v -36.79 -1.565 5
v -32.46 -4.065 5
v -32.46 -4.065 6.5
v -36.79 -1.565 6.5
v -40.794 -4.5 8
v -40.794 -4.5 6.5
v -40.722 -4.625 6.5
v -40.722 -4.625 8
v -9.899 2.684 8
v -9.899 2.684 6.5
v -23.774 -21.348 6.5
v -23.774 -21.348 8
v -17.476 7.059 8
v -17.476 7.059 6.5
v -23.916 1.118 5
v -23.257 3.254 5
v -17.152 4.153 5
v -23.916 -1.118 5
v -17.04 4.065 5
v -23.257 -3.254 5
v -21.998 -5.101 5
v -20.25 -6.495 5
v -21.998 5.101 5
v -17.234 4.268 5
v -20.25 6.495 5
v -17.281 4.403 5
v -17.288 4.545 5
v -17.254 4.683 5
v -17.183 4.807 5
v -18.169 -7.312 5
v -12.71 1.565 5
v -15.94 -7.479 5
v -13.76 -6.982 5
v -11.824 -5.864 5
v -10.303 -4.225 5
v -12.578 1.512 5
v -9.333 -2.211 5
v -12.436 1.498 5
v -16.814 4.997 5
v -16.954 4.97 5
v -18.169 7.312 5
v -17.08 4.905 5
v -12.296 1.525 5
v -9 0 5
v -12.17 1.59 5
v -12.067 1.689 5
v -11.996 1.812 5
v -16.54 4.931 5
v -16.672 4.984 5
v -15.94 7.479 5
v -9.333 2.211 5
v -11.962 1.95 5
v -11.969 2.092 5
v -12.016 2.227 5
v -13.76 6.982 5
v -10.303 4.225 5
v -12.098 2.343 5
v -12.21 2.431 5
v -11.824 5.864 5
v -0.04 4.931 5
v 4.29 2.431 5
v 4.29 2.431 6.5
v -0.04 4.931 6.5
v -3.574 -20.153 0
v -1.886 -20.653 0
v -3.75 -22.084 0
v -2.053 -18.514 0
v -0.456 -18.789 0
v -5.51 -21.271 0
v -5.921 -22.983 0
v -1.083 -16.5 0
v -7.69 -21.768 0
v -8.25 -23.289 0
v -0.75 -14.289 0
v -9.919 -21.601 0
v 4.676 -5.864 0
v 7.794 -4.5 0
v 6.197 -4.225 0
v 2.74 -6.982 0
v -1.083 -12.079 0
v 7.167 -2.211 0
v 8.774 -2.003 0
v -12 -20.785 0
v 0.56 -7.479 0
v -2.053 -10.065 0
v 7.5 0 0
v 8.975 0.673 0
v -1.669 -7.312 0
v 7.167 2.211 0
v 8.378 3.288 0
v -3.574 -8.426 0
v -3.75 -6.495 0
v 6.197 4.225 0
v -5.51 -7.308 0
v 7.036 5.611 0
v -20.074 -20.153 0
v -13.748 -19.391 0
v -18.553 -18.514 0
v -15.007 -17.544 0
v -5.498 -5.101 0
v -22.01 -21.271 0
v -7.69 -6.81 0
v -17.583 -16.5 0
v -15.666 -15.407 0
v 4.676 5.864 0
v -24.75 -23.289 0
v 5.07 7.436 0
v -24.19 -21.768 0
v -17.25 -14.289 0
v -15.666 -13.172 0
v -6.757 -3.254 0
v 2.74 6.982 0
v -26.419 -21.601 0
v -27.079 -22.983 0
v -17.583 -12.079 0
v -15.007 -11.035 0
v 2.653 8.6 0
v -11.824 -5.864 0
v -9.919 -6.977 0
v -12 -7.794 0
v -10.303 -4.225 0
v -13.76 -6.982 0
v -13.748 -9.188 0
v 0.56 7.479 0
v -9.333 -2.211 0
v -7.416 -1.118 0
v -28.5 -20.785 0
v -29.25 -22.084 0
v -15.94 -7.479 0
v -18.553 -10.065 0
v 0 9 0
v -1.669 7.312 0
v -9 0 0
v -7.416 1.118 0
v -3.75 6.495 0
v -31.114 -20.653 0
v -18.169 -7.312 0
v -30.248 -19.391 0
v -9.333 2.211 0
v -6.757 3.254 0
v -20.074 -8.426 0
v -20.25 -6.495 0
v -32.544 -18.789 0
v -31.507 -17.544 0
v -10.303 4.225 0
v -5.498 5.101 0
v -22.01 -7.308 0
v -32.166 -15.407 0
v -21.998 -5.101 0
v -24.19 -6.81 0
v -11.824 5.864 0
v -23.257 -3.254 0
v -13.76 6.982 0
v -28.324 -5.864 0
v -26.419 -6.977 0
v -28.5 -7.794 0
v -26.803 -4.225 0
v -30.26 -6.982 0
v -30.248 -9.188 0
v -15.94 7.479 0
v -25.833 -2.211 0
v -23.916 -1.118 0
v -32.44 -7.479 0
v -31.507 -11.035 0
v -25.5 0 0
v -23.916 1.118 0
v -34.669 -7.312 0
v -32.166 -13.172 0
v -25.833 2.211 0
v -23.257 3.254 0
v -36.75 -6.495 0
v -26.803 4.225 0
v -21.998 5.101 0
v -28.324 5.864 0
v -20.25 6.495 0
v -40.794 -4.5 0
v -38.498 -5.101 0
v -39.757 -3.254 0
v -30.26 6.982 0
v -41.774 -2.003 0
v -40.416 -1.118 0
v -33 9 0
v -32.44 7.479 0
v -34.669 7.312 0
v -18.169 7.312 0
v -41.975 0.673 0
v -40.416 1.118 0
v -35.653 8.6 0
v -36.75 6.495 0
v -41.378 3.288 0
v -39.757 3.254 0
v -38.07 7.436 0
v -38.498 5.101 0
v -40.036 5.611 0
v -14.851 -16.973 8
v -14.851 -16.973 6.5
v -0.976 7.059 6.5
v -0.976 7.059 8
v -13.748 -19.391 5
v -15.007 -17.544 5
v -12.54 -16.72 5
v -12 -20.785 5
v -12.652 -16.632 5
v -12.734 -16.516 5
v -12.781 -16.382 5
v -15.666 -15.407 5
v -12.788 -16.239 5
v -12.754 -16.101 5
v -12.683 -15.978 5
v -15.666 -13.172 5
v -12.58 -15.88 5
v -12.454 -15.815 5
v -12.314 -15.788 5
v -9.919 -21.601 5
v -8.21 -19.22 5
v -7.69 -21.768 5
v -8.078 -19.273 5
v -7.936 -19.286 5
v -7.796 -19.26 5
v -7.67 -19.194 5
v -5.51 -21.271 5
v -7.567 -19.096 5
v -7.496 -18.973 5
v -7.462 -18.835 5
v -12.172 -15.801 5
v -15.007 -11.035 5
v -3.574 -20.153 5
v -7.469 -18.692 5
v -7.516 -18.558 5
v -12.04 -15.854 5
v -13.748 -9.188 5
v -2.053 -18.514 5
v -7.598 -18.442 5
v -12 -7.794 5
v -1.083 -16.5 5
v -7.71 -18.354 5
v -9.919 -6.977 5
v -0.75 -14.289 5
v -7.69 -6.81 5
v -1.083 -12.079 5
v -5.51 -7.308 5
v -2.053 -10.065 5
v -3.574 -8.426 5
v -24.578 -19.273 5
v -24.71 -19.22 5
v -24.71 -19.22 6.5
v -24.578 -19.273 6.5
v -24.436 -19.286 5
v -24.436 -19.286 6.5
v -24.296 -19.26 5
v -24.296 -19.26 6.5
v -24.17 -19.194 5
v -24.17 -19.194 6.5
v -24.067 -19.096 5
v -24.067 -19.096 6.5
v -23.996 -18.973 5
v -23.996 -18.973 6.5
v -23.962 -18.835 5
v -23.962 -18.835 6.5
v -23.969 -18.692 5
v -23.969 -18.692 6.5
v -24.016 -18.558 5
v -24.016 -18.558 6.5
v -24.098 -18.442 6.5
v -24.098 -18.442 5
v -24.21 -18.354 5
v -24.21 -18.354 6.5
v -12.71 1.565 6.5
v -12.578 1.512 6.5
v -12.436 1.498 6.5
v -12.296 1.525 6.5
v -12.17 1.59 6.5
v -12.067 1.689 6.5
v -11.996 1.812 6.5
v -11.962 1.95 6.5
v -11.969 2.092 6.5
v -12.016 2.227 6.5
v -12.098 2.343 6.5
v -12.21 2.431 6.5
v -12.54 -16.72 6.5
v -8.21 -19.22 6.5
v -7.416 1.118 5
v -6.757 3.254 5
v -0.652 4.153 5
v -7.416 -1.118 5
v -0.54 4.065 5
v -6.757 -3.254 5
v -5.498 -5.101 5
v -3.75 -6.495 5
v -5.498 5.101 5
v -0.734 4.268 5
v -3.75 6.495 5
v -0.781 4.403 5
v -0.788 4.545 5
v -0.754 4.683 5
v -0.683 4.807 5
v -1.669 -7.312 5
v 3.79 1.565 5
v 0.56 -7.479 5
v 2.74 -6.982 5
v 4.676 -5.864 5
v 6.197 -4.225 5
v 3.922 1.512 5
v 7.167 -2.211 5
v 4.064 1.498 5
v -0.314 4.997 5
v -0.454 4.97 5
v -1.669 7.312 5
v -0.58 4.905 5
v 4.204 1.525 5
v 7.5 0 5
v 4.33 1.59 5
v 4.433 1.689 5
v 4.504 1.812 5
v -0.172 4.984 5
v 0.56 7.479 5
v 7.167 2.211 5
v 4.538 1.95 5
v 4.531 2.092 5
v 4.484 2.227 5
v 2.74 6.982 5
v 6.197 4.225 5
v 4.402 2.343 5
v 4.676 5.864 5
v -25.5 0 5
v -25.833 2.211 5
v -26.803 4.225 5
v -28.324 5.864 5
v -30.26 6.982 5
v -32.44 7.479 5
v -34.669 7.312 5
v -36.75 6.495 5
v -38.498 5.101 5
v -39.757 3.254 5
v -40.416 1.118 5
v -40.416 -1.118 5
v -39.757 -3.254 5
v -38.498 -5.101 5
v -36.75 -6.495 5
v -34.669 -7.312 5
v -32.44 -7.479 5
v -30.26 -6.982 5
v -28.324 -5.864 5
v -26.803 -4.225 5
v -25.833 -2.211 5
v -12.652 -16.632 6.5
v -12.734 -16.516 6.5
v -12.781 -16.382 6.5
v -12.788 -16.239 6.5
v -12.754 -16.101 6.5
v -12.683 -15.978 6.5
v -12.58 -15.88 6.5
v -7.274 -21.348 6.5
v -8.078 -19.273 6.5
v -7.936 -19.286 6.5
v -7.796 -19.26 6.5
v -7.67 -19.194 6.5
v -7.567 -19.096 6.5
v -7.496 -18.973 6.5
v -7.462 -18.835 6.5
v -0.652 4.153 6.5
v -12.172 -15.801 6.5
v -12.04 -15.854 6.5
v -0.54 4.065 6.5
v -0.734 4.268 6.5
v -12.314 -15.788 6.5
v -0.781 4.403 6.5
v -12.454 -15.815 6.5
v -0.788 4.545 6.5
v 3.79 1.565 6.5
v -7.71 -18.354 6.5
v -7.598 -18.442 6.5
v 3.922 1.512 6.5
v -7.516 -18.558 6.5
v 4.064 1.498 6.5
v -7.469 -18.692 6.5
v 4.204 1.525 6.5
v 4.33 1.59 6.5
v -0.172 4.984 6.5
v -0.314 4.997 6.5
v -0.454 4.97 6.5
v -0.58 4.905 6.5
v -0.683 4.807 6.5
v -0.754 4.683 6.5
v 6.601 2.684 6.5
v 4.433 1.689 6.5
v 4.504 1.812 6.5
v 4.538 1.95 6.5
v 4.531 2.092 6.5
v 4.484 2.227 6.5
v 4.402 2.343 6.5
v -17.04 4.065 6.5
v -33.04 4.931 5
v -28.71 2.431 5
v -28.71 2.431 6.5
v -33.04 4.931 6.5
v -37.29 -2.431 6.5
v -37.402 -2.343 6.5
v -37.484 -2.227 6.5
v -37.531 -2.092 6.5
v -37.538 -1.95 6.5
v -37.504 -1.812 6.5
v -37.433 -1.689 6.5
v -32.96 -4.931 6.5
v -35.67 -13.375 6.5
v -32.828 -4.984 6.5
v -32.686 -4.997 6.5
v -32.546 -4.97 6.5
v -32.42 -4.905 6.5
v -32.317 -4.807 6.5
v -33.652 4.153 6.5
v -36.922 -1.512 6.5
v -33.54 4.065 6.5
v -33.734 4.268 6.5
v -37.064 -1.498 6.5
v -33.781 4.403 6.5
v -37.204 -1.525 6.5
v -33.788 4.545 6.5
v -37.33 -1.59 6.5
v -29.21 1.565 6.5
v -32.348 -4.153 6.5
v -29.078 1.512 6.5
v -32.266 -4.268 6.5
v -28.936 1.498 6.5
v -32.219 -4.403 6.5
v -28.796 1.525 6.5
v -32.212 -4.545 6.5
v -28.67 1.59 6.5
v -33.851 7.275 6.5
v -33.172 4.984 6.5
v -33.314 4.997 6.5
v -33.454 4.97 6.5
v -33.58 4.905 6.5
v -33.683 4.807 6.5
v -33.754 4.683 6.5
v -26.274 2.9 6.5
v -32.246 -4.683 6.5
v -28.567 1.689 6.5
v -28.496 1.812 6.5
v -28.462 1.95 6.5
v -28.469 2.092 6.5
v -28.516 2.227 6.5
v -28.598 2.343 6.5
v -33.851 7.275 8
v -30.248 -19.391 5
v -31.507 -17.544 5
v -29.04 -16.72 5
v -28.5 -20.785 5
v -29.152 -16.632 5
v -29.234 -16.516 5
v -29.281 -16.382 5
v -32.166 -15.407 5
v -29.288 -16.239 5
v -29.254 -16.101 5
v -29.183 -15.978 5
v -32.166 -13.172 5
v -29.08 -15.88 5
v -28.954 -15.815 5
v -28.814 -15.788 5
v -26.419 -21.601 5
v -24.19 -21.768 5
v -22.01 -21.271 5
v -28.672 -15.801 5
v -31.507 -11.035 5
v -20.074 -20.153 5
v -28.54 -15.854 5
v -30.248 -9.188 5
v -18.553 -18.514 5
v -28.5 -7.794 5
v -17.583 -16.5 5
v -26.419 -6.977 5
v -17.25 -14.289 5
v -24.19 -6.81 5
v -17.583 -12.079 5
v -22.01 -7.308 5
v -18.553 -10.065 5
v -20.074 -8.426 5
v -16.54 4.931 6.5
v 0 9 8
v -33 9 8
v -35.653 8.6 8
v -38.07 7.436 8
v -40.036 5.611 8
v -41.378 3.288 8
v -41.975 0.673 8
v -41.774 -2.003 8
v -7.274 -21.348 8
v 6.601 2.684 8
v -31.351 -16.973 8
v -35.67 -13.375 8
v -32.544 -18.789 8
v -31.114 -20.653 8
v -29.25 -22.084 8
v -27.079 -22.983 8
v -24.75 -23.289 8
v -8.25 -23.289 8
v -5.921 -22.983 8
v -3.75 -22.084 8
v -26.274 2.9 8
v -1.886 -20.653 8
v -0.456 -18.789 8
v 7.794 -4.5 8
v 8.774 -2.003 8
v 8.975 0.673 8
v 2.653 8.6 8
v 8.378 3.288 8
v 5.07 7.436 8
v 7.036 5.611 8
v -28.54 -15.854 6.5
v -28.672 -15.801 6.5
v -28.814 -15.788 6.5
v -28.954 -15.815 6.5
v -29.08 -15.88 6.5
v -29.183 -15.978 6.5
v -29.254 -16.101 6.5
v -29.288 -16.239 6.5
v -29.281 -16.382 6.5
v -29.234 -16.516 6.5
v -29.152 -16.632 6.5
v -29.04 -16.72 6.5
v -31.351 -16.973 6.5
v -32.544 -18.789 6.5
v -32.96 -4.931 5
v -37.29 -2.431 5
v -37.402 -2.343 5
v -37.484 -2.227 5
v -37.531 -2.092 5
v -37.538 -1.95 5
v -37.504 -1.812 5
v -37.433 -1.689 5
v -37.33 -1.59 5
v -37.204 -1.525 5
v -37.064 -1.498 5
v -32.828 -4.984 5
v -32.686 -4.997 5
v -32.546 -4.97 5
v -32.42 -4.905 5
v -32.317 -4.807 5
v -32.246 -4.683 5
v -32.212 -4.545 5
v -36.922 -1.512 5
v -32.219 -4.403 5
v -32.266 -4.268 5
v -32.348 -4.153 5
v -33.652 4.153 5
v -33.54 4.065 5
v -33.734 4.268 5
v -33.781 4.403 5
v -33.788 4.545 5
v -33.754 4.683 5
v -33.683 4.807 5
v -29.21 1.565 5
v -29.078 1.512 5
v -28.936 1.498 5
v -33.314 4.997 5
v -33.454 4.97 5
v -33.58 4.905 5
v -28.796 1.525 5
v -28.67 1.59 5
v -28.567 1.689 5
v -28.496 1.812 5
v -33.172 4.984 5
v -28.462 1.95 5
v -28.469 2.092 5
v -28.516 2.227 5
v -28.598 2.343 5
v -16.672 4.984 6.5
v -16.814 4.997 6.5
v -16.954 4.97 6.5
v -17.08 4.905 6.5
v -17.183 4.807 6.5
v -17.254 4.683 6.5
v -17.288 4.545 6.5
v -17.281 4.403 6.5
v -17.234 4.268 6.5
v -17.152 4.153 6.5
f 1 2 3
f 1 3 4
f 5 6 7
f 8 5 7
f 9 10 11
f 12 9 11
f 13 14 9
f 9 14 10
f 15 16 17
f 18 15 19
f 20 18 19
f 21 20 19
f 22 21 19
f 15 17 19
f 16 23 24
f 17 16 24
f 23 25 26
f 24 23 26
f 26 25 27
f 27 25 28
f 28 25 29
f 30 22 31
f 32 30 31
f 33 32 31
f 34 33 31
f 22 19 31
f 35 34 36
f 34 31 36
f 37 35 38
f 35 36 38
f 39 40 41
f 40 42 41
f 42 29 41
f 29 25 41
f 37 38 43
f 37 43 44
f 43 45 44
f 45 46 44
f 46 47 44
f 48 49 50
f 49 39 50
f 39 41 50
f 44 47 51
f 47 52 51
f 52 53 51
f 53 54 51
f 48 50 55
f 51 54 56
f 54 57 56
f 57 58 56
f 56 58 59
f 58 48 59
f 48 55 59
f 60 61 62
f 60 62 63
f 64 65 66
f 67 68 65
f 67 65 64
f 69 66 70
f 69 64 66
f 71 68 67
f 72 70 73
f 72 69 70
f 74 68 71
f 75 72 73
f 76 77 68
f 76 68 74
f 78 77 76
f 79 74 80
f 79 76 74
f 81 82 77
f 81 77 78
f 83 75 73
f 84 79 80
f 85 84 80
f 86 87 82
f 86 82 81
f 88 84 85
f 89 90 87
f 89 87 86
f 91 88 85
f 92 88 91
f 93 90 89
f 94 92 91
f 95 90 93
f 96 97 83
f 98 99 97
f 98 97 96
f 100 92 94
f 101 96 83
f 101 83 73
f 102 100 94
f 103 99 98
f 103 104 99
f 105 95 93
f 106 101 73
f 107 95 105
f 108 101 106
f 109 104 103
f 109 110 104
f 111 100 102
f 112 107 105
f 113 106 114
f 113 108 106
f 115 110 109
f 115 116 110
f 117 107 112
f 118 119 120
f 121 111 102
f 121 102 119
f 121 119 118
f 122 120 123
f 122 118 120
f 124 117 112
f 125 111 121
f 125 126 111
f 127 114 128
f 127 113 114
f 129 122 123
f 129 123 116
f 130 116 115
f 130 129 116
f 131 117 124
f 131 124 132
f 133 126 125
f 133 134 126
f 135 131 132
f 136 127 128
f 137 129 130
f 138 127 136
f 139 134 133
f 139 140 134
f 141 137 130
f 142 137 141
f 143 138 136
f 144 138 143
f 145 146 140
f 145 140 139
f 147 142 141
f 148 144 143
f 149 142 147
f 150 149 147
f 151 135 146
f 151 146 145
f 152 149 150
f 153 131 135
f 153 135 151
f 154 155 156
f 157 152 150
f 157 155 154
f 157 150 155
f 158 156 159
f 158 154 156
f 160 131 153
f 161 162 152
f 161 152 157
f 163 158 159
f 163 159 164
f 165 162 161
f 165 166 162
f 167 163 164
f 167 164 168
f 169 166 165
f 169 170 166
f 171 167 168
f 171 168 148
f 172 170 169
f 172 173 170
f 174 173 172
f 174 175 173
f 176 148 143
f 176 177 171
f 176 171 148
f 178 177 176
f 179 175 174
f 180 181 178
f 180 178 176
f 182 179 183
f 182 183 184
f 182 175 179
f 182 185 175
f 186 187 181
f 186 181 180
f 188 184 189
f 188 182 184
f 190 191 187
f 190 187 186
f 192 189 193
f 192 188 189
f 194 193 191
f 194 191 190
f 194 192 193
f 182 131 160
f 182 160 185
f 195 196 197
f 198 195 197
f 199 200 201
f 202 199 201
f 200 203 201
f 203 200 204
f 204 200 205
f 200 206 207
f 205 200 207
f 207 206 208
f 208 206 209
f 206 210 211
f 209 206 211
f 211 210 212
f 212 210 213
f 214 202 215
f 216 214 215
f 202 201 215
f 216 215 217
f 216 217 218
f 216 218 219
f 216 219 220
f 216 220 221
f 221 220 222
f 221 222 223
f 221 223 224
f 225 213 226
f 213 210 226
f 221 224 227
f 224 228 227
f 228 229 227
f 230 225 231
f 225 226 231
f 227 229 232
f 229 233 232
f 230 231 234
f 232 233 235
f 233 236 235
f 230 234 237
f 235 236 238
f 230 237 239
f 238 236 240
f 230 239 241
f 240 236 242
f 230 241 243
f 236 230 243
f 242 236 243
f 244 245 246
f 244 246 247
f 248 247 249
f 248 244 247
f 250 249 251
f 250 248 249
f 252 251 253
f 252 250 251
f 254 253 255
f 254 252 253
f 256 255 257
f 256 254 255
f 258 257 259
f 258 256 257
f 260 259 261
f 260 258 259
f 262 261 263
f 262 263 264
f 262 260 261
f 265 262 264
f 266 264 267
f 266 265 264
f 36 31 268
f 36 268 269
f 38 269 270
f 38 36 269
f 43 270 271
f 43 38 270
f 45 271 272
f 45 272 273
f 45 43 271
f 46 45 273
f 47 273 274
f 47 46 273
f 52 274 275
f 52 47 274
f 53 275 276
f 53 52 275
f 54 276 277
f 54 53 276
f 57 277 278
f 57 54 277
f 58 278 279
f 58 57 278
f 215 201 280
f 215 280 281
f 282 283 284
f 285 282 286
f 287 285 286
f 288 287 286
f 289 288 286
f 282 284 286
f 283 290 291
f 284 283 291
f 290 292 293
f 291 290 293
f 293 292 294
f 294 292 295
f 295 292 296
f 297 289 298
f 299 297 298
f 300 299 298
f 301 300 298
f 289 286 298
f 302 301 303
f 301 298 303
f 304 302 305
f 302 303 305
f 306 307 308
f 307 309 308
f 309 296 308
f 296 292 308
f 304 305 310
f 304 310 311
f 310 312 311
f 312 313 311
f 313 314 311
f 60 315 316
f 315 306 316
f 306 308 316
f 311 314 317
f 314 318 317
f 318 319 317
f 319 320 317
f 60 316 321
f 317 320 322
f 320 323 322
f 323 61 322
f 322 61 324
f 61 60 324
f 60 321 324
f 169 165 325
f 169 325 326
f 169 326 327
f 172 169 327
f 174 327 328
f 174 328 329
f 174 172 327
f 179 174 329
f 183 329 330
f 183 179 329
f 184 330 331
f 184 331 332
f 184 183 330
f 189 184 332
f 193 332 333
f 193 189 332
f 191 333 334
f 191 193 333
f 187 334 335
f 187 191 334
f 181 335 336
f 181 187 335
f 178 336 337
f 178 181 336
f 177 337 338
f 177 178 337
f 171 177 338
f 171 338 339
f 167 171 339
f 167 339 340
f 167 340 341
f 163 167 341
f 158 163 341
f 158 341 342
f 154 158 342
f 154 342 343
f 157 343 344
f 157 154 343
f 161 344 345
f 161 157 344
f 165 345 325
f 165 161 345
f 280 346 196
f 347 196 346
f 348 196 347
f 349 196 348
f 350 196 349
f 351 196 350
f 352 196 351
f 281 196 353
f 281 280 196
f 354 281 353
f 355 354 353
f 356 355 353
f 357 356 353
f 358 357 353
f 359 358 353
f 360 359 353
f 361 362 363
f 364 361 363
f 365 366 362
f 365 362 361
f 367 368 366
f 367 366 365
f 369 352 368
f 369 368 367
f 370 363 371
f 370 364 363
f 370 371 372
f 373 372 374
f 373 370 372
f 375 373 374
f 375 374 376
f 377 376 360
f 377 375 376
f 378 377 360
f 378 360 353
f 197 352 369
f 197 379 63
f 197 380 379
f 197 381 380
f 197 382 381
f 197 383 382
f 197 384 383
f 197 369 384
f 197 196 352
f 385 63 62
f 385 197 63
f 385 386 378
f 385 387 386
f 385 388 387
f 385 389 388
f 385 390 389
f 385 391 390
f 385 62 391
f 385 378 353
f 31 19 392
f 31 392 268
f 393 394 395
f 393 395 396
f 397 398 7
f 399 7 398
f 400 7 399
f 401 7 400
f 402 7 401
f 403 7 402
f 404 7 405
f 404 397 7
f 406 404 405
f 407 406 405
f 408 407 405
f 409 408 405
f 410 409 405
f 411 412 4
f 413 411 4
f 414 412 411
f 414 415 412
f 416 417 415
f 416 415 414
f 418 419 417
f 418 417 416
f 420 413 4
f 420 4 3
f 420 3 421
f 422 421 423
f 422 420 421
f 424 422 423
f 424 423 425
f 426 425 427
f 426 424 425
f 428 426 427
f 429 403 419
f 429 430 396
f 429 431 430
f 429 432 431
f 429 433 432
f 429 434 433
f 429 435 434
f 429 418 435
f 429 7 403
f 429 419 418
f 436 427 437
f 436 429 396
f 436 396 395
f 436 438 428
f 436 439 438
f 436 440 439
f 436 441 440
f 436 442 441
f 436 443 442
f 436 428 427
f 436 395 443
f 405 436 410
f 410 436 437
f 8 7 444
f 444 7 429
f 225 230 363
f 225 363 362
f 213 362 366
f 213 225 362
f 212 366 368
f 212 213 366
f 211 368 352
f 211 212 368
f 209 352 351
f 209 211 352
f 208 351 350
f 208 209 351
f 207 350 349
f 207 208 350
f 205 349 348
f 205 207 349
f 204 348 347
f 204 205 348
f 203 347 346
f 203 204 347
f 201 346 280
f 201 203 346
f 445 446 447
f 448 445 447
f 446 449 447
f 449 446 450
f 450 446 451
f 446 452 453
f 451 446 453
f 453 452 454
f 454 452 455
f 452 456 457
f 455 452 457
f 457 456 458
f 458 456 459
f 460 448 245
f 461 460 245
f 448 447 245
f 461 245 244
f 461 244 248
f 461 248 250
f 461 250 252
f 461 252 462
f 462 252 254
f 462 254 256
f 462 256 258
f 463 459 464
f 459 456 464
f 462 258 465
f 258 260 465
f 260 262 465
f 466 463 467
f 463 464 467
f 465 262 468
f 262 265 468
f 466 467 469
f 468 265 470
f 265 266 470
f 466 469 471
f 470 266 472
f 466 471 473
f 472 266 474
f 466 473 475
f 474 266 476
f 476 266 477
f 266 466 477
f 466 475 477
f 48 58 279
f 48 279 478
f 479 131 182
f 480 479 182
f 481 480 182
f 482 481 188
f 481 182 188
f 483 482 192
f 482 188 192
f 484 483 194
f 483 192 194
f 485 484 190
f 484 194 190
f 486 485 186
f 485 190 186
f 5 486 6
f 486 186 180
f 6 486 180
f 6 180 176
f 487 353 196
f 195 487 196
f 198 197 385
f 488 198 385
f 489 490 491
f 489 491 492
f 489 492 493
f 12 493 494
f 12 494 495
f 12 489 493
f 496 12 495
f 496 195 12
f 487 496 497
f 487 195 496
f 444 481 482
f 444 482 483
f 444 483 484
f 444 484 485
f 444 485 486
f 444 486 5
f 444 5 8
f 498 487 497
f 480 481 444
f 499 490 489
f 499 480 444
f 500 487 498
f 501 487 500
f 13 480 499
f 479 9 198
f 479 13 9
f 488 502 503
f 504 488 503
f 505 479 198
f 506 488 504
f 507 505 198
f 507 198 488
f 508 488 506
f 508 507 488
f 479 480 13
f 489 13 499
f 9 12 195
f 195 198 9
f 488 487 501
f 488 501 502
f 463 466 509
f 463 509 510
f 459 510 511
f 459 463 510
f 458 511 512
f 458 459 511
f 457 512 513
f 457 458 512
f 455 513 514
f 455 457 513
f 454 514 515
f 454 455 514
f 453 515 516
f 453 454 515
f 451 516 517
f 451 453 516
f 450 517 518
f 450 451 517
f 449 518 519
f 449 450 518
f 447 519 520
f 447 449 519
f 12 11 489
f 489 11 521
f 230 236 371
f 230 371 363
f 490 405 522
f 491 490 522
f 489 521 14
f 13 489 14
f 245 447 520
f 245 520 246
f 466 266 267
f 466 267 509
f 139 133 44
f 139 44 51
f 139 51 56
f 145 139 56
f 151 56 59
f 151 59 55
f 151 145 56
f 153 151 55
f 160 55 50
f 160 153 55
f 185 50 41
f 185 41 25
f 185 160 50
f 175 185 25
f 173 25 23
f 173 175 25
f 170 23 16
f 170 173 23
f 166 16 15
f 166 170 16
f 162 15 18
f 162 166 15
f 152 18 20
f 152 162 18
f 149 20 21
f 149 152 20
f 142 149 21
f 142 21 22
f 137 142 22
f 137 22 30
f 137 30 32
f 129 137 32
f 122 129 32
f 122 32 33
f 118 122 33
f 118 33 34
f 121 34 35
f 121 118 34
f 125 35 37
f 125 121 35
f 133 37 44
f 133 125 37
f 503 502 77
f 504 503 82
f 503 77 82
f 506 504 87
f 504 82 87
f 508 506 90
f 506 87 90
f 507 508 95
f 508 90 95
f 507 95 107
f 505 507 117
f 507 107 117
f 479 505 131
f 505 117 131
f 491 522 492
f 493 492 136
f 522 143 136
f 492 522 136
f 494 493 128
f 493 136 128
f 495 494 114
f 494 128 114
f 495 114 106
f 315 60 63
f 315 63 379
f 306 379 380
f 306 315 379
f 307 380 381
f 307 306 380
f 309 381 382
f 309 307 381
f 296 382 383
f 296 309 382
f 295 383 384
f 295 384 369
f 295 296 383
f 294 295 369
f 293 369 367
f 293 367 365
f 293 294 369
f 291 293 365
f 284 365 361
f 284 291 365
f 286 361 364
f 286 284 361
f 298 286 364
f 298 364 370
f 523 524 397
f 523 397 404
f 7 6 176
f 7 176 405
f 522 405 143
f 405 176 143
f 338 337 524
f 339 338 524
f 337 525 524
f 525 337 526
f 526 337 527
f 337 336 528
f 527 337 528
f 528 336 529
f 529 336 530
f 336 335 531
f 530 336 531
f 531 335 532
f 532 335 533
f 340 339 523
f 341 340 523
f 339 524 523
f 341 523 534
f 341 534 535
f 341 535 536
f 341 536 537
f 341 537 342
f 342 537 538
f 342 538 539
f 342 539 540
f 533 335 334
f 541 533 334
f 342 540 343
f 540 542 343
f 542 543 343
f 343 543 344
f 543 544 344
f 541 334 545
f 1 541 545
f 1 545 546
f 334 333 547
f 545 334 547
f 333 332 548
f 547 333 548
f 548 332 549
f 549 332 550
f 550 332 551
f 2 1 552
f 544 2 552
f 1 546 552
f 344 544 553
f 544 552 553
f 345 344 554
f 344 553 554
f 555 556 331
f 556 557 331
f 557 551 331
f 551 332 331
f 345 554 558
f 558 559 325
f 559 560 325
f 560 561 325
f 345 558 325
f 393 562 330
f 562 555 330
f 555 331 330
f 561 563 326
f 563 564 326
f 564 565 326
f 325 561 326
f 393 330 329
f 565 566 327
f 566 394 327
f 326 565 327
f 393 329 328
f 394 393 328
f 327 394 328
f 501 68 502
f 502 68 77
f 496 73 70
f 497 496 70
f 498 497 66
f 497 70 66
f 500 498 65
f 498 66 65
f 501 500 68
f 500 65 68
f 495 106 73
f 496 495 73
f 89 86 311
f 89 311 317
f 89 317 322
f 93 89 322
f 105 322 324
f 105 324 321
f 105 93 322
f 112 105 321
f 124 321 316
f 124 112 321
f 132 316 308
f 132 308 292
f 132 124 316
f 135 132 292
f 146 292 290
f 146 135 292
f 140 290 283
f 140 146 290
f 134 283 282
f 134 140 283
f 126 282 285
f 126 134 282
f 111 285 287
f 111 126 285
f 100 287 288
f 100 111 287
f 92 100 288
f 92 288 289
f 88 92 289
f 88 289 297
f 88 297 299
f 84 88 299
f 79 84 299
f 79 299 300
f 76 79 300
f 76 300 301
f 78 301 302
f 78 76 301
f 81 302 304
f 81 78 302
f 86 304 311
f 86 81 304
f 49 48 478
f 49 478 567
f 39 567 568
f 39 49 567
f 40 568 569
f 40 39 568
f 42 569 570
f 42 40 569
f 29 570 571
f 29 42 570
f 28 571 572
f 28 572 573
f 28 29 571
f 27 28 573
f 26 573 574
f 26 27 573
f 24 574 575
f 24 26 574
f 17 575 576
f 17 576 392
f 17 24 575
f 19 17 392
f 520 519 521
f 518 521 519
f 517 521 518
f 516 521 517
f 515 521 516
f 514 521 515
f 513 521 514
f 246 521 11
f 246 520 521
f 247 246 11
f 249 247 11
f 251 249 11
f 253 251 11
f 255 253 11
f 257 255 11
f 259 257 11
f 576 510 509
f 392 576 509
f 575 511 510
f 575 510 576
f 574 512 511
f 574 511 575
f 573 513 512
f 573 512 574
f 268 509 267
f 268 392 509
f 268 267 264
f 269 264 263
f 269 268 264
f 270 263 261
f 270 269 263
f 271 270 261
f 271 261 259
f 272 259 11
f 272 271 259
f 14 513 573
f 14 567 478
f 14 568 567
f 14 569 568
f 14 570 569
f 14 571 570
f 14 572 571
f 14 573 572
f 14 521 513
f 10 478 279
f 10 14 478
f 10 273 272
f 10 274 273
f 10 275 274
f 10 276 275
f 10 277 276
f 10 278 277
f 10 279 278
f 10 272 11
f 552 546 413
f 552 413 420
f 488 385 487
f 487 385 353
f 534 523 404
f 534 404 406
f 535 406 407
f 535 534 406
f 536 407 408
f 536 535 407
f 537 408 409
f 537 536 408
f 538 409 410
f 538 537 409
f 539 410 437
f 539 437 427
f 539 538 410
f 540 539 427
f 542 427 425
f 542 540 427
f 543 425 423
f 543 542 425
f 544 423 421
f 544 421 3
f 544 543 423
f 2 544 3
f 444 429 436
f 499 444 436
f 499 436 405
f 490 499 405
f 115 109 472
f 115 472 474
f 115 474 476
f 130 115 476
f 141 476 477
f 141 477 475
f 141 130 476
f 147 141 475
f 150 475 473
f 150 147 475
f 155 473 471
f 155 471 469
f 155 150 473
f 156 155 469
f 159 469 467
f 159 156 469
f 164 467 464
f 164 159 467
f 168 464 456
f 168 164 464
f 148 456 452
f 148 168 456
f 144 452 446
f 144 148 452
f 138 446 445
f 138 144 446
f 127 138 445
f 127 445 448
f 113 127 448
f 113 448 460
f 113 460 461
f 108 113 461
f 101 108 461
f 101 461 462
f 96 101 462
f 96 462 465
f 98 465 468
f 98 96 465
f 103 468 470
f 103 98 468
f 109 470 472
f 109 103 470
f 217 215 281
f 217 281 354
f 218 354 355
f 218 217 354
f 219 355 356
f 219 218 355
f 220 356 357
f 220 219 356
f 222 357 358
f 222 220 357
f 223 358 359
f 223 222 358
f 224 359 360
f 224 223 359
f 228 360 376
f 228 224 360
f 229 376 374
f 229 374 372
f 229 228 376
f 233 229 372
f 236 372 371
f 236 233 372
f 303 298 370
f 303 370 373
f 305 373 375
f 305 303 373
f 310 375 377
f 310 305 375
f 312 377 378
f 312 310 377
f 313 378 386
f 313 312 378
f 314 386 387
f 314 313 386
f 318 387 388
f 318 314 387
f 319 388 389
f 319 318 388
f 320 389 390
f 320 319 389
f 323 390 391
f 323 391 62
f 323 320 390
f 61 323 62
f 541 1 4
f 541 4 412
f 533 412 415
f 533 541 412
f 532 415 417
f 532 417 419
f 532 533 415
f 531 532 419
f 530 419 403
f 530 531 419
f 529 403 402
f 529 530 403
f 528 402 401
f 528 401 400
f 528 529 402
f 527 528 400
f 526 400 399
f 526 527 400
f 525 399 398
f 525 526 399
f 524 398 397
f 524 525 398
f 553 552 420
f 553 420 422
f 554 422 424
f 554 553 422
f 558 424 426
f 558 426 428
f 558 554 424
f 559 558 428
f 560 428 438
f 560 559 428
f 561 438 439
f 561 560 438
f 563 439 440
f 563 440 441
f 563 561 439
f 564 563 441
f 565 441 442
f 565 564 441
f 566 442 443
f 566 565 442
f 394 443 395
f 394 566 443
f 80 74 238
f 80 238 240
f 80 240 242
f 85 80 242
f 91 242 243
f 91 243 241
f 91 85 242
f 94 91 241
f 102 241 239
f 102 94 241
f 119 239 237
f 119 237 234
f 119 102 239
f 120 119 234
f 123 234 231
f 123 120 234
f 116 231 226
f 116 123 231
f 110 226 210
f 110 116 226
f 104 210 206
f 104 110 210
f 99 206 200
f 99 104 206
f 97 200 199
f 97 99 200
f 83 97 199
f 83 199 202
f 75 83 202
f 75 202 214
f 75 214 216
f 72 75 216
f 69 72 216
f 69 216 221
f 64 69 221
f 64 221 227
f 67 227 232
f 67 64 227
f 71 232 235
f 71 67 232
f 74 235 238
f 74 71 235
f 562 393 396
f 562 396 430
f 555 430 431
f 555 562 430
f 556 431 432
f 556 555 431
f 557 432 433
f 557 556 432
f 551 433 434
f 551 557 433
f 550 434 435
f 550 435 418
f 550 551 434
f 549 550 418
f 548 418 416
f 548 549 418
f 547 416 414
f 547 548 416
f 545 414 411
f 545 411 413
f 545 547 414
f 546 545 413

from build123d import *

# Parameters (mm, degrees)
SKETCH1_R           = 7.5
BOSS_EXTRUDE1_DEPTH = 5
SKETCH2_R           = 7.5
BOSS_EXTRUDE2_DEPTH = 1.5
BOSS_EXTRUDE3_DEPTH = 1.5


with BuildPart() as part:
    # Sketch1 → Boss-Extrude1 (new body)
    with BuildSketch(Plane.XY):
        with BuildLine():
            Line((7.794228634, -4.5), (-0.455771366, -18.789419162))
            ThreePointArc((-0.455771366, -18.789419162), (-3.75, -22.083647797), (-8.25, -23.289419162))
            Line((-8.25, -23.289419162), (-24.75, -23.289419162))
            ThreePointArc((-24.75, -23.289419162), (-29.25, -22.083647797), (-32.544228634, -18.789419162))
            Line((-32.544228634, -18.789419162), (-40.794228634, -4.5))
            ThreePointArc((-40.794228634, -4.5), (-40.794228634, 4.5), (-33, 9))
            Line((-33, 9), (0, 9))
            ThreePointArc((0, 9), (7.794228634, 4.5), (7.794228634, -4.5))
        make_face()
        with Locations((-24.75, -14.289419162)):
            Circle(SKETCH1_R, mode=Mode.SUBTRACT)
        with Locations((-16.5, 0)):
            Circle(SKETCH1_R, mode=Mode.SUBTRACT)
        Circle(SKETCH1_R, mode=Mode.SUBTRACT)
        with Locations((-8.25, -14.289419162)):
            Circle(SKETCH1_R, mode=Mode.SUBTRACT)
        with Locations((-33, 0)):
            Circle(SKETCH1_R, mode=Mode.SUBTRACT)
    extrude(amount=BOSS_EXTRUDE1_DEPTH)

    # Sketch2 → Boss-Extrude2 (add)
    # profile 1 of 6: a face of its own
    with BuildSketch(Plane.XY.offset(5)):
        with BuildLine():
            Line((-0.455771366, -18.789419162), (7.794228634, -4.5))
            ThreePointArc((7.794228634, -4.5), (7.794228634, 4.5), (0, 9))
            Line((0, 9), (-33, 9))
            ThreePointArc((-33, 9), (-40.794228634, 4.5), (-40.794228634, -4.5))
            Line((-40.794228634, -4.5), (-32.544228634, -18.789419162))
            ThreePointArc((-32.544228634, -18.789419162), (-29.25, -22.083647797), (-24.75, -23.289419162))
            Line((-24.75, -23.289419162), (-8.25, -23.289419162))
            ThreePointArc((-8.25, -23.289419162), (-3.75, -22.083647797), (-0.455771366, -18.789419162))
        make_face()
        Circle(SKETCH2_R, mode=Mode.SUBTRACT)
        with Locations((-16.5, 0)):
            Circle(SKETCH2_R, mode=Mode.SUBTRACT)
        with Locations((-33, 0)):
            Circle(SKETCH2_R, mode=Mode.SUBTRACT)
        with Locations((-24.75, -14.289419162)):
            Circle(SKETCH2_R, mode=Mode.SUBTRACT)
        with Locations((-8.25, -14.289419162)):
            Circle(SKETCH2_R, mode=Mode.SUBTRACT)
    # profile 2 of 6: a face of its own
    with BuildSketch(Plane.XY.offset(5)):
        with Locations((-8.25, -14.289419162)):
            Circle(SKETCH2_R)
        with BuildLine():
            ThreePointArc((-12.040063509, -15.854001725), (-12.723076211, -16.037014427), (-12.540063509, -16.720027129))
            Line((-12.540063509, -16.720027129), (-8.209936491, -19.220027129))
            ThreePointArc((-8.209936491, -19.220027129), (-7.526923789, -19.037014427), (-7.709936491, -18.354001725))
            Line((-7.709936491, -18.354001725), (-12.040063509, -15.854001725))
        make_face(mode=Mode.SUBTRACT)
    # profile 3 of 6: a face of its own
    with BuildSketch(Plane.XY.offset(5)):
        Circle(SKETCH2_R)
        with BuildLine():
            ThreePointArc((-0.040063509, 4.930607966), (-0.723076211, 4.747595264), (-0.540063509, 4.064582562))
            Line((-0.540063509, 4.064582562), (3.790063509, 1.564582562))
            ThreePointArc((3.790063509, 1.564582562), (4.473076211, 1.747595264), (4.290063509, 2.430607966))
            Line((4.290063509, 2.430607966), (-0.040063509, 4.930607966))
        make_face(mode=Mode.SUBTRACT)
    # profile 4 of 6: a face of its own
    with BuildSketch(Plane.XY.offset(5)):
        with Locations((-16.5, 0)):
            Circle(SKETCH2_R)
        with BuildLine():
            ThreePointArc((-16.540063509, 4.930607966), (-17.223076211, 4.747595264), (-17.040063509, 4.064582562))
            Line((-17.040063509, 4.064582562), (-12.709936491, 1.564582562))
            ThreePointArc((-12.709936491, 1.564582562), (-12.026923789, 1.747595264), (-12.209936491, 2.430607966))
            Line((-12.209936491, 2.430607966), (-16.540063509, 4.930607966))
        make_face(mode=Mode.SUBTRACT)
    # profile 5 of 6: a face of its own
    with BuildSketch(Plane.XY.offset(5)):
        with Locations((-24.75, -14.289419162)):
            Circle(SKETCH2_R)
        with BuildLine():
            ThreePointArc((-28.540063509, -15.854001725), (-29.223076211, -16.037014427), (-29.040063509, -16.720027129))
            Line((-29.040063509, -16.720027129), (-24.709936491, -19.220027129))
            ThreePointArc((-24.709936491, -19.220027129), (-24.026923789, -19.037014427), (-24.209936491, -18.354001725))
            Line((-24.209936491, -18.354001725), (-28.540063509, -15.854001725))
        make_face(mode=Mode.SUBTRACT)
    # profile 6 of 6: a face of its own
    with BuildSketch(Plane.XY.offset(5)):
        with Locations((-33, 0)):
            Circle(SKETCH2_R)
        with BuildLine():
            ThreePointArc((-36.790063509, -1.564582562), (-37.473076211, -1.747595264), (-37.290063509, -2.430607966))
            Line((-37.290063509, -2.430607966), (-32.959936491, -4.930607966))
            ThreePointArc((-32.959936491, -4.930607966), (-32.276923789, -4.747595264), (-32.459936491, -4.064582562))
            Line((-32.459936491, -4.064582562), (-36.790063509, -1.564582562))
        make_face(mode=Mode.SUBTRACT)
        with BuildLine():
            ThreePointArc((-33.040063509, 4.930607966), (-33.723076211, 4.747595264), (-33.540063509, 4.064582562))
            Line((-33.540063509, 4.064582562), (-29.209936491, 1.564582562))
            ThreePointArc((-29.209936491, 1.564582562), (-28.526923789, 1.747595264), (-28.709936491, 2.430607966))
            Line((-28.709936491, 2.430607966), (-33.040063509, 4.930607966))
        make_face(mode=Mode.SUBTRACT)
    extrude(amount=BOSS_EXTRUDE2_DEPTH)

    # Sketch3 → Boss-Extrude3 (add)
    with BuildSketch(Plane.XY.offset(6.5)):
        with BuildLine():
            ThreePointArc((-33, 9), (-40.794228634, 4.5), (-40.794228634, -4.5))
            Line((-40.794228634, -4.5), (-40.72205985, -4.625))
            Line((-40.72205985, -4.625), (-33.851361142, 7.275399247))
            Line((-33.851361142, 7.275399247), (-26.273638858, 2.900399247))
            Line((-26.273638858, 2.900399247), (-35.670244995, -13.375))
            Line((-35.670244995, -13.375), (-32.544228634, -18.789419162))
            ThreePointArc((-32.544228634, -18.789419162), (-29.25, -22.083647797), (-24.75, -23.289419162))
            Line((-24.75, -23.289419162), (-8.25, -23.289419162))
            ThreePointArc((-8.25, -23.289419162), (-3.75, -22.083647797), (-0.455771366, -18.789419162))
            Line((-0.455771366, -18.789419162), (7.794228634, -4.5))
            ThreePointArc((7.794228634, -4.5), (7.794228634, 4.5), (0, 9))
            Line((0, 9), (-33, 9))
        make_face()
        Polygon((-17.476361142, 7.058892896), (-9.898638858, 2.683892896), (-23.773638858, -21.348312059), (-31.351361142, -16.973312059), align=None, mode=Mode.SUBTRACT)
        Polygon((-0.976361142, 7.058892896), (6.601361142, 2.683892896), (-7.273638858, -21.348312059), (-14.851361142, -16.973312059), align=None, mode=Mode.SUBTRACT)
    extrude(amount=BOSS_EXTRUDE3_DEPTH)


solid = part.part
